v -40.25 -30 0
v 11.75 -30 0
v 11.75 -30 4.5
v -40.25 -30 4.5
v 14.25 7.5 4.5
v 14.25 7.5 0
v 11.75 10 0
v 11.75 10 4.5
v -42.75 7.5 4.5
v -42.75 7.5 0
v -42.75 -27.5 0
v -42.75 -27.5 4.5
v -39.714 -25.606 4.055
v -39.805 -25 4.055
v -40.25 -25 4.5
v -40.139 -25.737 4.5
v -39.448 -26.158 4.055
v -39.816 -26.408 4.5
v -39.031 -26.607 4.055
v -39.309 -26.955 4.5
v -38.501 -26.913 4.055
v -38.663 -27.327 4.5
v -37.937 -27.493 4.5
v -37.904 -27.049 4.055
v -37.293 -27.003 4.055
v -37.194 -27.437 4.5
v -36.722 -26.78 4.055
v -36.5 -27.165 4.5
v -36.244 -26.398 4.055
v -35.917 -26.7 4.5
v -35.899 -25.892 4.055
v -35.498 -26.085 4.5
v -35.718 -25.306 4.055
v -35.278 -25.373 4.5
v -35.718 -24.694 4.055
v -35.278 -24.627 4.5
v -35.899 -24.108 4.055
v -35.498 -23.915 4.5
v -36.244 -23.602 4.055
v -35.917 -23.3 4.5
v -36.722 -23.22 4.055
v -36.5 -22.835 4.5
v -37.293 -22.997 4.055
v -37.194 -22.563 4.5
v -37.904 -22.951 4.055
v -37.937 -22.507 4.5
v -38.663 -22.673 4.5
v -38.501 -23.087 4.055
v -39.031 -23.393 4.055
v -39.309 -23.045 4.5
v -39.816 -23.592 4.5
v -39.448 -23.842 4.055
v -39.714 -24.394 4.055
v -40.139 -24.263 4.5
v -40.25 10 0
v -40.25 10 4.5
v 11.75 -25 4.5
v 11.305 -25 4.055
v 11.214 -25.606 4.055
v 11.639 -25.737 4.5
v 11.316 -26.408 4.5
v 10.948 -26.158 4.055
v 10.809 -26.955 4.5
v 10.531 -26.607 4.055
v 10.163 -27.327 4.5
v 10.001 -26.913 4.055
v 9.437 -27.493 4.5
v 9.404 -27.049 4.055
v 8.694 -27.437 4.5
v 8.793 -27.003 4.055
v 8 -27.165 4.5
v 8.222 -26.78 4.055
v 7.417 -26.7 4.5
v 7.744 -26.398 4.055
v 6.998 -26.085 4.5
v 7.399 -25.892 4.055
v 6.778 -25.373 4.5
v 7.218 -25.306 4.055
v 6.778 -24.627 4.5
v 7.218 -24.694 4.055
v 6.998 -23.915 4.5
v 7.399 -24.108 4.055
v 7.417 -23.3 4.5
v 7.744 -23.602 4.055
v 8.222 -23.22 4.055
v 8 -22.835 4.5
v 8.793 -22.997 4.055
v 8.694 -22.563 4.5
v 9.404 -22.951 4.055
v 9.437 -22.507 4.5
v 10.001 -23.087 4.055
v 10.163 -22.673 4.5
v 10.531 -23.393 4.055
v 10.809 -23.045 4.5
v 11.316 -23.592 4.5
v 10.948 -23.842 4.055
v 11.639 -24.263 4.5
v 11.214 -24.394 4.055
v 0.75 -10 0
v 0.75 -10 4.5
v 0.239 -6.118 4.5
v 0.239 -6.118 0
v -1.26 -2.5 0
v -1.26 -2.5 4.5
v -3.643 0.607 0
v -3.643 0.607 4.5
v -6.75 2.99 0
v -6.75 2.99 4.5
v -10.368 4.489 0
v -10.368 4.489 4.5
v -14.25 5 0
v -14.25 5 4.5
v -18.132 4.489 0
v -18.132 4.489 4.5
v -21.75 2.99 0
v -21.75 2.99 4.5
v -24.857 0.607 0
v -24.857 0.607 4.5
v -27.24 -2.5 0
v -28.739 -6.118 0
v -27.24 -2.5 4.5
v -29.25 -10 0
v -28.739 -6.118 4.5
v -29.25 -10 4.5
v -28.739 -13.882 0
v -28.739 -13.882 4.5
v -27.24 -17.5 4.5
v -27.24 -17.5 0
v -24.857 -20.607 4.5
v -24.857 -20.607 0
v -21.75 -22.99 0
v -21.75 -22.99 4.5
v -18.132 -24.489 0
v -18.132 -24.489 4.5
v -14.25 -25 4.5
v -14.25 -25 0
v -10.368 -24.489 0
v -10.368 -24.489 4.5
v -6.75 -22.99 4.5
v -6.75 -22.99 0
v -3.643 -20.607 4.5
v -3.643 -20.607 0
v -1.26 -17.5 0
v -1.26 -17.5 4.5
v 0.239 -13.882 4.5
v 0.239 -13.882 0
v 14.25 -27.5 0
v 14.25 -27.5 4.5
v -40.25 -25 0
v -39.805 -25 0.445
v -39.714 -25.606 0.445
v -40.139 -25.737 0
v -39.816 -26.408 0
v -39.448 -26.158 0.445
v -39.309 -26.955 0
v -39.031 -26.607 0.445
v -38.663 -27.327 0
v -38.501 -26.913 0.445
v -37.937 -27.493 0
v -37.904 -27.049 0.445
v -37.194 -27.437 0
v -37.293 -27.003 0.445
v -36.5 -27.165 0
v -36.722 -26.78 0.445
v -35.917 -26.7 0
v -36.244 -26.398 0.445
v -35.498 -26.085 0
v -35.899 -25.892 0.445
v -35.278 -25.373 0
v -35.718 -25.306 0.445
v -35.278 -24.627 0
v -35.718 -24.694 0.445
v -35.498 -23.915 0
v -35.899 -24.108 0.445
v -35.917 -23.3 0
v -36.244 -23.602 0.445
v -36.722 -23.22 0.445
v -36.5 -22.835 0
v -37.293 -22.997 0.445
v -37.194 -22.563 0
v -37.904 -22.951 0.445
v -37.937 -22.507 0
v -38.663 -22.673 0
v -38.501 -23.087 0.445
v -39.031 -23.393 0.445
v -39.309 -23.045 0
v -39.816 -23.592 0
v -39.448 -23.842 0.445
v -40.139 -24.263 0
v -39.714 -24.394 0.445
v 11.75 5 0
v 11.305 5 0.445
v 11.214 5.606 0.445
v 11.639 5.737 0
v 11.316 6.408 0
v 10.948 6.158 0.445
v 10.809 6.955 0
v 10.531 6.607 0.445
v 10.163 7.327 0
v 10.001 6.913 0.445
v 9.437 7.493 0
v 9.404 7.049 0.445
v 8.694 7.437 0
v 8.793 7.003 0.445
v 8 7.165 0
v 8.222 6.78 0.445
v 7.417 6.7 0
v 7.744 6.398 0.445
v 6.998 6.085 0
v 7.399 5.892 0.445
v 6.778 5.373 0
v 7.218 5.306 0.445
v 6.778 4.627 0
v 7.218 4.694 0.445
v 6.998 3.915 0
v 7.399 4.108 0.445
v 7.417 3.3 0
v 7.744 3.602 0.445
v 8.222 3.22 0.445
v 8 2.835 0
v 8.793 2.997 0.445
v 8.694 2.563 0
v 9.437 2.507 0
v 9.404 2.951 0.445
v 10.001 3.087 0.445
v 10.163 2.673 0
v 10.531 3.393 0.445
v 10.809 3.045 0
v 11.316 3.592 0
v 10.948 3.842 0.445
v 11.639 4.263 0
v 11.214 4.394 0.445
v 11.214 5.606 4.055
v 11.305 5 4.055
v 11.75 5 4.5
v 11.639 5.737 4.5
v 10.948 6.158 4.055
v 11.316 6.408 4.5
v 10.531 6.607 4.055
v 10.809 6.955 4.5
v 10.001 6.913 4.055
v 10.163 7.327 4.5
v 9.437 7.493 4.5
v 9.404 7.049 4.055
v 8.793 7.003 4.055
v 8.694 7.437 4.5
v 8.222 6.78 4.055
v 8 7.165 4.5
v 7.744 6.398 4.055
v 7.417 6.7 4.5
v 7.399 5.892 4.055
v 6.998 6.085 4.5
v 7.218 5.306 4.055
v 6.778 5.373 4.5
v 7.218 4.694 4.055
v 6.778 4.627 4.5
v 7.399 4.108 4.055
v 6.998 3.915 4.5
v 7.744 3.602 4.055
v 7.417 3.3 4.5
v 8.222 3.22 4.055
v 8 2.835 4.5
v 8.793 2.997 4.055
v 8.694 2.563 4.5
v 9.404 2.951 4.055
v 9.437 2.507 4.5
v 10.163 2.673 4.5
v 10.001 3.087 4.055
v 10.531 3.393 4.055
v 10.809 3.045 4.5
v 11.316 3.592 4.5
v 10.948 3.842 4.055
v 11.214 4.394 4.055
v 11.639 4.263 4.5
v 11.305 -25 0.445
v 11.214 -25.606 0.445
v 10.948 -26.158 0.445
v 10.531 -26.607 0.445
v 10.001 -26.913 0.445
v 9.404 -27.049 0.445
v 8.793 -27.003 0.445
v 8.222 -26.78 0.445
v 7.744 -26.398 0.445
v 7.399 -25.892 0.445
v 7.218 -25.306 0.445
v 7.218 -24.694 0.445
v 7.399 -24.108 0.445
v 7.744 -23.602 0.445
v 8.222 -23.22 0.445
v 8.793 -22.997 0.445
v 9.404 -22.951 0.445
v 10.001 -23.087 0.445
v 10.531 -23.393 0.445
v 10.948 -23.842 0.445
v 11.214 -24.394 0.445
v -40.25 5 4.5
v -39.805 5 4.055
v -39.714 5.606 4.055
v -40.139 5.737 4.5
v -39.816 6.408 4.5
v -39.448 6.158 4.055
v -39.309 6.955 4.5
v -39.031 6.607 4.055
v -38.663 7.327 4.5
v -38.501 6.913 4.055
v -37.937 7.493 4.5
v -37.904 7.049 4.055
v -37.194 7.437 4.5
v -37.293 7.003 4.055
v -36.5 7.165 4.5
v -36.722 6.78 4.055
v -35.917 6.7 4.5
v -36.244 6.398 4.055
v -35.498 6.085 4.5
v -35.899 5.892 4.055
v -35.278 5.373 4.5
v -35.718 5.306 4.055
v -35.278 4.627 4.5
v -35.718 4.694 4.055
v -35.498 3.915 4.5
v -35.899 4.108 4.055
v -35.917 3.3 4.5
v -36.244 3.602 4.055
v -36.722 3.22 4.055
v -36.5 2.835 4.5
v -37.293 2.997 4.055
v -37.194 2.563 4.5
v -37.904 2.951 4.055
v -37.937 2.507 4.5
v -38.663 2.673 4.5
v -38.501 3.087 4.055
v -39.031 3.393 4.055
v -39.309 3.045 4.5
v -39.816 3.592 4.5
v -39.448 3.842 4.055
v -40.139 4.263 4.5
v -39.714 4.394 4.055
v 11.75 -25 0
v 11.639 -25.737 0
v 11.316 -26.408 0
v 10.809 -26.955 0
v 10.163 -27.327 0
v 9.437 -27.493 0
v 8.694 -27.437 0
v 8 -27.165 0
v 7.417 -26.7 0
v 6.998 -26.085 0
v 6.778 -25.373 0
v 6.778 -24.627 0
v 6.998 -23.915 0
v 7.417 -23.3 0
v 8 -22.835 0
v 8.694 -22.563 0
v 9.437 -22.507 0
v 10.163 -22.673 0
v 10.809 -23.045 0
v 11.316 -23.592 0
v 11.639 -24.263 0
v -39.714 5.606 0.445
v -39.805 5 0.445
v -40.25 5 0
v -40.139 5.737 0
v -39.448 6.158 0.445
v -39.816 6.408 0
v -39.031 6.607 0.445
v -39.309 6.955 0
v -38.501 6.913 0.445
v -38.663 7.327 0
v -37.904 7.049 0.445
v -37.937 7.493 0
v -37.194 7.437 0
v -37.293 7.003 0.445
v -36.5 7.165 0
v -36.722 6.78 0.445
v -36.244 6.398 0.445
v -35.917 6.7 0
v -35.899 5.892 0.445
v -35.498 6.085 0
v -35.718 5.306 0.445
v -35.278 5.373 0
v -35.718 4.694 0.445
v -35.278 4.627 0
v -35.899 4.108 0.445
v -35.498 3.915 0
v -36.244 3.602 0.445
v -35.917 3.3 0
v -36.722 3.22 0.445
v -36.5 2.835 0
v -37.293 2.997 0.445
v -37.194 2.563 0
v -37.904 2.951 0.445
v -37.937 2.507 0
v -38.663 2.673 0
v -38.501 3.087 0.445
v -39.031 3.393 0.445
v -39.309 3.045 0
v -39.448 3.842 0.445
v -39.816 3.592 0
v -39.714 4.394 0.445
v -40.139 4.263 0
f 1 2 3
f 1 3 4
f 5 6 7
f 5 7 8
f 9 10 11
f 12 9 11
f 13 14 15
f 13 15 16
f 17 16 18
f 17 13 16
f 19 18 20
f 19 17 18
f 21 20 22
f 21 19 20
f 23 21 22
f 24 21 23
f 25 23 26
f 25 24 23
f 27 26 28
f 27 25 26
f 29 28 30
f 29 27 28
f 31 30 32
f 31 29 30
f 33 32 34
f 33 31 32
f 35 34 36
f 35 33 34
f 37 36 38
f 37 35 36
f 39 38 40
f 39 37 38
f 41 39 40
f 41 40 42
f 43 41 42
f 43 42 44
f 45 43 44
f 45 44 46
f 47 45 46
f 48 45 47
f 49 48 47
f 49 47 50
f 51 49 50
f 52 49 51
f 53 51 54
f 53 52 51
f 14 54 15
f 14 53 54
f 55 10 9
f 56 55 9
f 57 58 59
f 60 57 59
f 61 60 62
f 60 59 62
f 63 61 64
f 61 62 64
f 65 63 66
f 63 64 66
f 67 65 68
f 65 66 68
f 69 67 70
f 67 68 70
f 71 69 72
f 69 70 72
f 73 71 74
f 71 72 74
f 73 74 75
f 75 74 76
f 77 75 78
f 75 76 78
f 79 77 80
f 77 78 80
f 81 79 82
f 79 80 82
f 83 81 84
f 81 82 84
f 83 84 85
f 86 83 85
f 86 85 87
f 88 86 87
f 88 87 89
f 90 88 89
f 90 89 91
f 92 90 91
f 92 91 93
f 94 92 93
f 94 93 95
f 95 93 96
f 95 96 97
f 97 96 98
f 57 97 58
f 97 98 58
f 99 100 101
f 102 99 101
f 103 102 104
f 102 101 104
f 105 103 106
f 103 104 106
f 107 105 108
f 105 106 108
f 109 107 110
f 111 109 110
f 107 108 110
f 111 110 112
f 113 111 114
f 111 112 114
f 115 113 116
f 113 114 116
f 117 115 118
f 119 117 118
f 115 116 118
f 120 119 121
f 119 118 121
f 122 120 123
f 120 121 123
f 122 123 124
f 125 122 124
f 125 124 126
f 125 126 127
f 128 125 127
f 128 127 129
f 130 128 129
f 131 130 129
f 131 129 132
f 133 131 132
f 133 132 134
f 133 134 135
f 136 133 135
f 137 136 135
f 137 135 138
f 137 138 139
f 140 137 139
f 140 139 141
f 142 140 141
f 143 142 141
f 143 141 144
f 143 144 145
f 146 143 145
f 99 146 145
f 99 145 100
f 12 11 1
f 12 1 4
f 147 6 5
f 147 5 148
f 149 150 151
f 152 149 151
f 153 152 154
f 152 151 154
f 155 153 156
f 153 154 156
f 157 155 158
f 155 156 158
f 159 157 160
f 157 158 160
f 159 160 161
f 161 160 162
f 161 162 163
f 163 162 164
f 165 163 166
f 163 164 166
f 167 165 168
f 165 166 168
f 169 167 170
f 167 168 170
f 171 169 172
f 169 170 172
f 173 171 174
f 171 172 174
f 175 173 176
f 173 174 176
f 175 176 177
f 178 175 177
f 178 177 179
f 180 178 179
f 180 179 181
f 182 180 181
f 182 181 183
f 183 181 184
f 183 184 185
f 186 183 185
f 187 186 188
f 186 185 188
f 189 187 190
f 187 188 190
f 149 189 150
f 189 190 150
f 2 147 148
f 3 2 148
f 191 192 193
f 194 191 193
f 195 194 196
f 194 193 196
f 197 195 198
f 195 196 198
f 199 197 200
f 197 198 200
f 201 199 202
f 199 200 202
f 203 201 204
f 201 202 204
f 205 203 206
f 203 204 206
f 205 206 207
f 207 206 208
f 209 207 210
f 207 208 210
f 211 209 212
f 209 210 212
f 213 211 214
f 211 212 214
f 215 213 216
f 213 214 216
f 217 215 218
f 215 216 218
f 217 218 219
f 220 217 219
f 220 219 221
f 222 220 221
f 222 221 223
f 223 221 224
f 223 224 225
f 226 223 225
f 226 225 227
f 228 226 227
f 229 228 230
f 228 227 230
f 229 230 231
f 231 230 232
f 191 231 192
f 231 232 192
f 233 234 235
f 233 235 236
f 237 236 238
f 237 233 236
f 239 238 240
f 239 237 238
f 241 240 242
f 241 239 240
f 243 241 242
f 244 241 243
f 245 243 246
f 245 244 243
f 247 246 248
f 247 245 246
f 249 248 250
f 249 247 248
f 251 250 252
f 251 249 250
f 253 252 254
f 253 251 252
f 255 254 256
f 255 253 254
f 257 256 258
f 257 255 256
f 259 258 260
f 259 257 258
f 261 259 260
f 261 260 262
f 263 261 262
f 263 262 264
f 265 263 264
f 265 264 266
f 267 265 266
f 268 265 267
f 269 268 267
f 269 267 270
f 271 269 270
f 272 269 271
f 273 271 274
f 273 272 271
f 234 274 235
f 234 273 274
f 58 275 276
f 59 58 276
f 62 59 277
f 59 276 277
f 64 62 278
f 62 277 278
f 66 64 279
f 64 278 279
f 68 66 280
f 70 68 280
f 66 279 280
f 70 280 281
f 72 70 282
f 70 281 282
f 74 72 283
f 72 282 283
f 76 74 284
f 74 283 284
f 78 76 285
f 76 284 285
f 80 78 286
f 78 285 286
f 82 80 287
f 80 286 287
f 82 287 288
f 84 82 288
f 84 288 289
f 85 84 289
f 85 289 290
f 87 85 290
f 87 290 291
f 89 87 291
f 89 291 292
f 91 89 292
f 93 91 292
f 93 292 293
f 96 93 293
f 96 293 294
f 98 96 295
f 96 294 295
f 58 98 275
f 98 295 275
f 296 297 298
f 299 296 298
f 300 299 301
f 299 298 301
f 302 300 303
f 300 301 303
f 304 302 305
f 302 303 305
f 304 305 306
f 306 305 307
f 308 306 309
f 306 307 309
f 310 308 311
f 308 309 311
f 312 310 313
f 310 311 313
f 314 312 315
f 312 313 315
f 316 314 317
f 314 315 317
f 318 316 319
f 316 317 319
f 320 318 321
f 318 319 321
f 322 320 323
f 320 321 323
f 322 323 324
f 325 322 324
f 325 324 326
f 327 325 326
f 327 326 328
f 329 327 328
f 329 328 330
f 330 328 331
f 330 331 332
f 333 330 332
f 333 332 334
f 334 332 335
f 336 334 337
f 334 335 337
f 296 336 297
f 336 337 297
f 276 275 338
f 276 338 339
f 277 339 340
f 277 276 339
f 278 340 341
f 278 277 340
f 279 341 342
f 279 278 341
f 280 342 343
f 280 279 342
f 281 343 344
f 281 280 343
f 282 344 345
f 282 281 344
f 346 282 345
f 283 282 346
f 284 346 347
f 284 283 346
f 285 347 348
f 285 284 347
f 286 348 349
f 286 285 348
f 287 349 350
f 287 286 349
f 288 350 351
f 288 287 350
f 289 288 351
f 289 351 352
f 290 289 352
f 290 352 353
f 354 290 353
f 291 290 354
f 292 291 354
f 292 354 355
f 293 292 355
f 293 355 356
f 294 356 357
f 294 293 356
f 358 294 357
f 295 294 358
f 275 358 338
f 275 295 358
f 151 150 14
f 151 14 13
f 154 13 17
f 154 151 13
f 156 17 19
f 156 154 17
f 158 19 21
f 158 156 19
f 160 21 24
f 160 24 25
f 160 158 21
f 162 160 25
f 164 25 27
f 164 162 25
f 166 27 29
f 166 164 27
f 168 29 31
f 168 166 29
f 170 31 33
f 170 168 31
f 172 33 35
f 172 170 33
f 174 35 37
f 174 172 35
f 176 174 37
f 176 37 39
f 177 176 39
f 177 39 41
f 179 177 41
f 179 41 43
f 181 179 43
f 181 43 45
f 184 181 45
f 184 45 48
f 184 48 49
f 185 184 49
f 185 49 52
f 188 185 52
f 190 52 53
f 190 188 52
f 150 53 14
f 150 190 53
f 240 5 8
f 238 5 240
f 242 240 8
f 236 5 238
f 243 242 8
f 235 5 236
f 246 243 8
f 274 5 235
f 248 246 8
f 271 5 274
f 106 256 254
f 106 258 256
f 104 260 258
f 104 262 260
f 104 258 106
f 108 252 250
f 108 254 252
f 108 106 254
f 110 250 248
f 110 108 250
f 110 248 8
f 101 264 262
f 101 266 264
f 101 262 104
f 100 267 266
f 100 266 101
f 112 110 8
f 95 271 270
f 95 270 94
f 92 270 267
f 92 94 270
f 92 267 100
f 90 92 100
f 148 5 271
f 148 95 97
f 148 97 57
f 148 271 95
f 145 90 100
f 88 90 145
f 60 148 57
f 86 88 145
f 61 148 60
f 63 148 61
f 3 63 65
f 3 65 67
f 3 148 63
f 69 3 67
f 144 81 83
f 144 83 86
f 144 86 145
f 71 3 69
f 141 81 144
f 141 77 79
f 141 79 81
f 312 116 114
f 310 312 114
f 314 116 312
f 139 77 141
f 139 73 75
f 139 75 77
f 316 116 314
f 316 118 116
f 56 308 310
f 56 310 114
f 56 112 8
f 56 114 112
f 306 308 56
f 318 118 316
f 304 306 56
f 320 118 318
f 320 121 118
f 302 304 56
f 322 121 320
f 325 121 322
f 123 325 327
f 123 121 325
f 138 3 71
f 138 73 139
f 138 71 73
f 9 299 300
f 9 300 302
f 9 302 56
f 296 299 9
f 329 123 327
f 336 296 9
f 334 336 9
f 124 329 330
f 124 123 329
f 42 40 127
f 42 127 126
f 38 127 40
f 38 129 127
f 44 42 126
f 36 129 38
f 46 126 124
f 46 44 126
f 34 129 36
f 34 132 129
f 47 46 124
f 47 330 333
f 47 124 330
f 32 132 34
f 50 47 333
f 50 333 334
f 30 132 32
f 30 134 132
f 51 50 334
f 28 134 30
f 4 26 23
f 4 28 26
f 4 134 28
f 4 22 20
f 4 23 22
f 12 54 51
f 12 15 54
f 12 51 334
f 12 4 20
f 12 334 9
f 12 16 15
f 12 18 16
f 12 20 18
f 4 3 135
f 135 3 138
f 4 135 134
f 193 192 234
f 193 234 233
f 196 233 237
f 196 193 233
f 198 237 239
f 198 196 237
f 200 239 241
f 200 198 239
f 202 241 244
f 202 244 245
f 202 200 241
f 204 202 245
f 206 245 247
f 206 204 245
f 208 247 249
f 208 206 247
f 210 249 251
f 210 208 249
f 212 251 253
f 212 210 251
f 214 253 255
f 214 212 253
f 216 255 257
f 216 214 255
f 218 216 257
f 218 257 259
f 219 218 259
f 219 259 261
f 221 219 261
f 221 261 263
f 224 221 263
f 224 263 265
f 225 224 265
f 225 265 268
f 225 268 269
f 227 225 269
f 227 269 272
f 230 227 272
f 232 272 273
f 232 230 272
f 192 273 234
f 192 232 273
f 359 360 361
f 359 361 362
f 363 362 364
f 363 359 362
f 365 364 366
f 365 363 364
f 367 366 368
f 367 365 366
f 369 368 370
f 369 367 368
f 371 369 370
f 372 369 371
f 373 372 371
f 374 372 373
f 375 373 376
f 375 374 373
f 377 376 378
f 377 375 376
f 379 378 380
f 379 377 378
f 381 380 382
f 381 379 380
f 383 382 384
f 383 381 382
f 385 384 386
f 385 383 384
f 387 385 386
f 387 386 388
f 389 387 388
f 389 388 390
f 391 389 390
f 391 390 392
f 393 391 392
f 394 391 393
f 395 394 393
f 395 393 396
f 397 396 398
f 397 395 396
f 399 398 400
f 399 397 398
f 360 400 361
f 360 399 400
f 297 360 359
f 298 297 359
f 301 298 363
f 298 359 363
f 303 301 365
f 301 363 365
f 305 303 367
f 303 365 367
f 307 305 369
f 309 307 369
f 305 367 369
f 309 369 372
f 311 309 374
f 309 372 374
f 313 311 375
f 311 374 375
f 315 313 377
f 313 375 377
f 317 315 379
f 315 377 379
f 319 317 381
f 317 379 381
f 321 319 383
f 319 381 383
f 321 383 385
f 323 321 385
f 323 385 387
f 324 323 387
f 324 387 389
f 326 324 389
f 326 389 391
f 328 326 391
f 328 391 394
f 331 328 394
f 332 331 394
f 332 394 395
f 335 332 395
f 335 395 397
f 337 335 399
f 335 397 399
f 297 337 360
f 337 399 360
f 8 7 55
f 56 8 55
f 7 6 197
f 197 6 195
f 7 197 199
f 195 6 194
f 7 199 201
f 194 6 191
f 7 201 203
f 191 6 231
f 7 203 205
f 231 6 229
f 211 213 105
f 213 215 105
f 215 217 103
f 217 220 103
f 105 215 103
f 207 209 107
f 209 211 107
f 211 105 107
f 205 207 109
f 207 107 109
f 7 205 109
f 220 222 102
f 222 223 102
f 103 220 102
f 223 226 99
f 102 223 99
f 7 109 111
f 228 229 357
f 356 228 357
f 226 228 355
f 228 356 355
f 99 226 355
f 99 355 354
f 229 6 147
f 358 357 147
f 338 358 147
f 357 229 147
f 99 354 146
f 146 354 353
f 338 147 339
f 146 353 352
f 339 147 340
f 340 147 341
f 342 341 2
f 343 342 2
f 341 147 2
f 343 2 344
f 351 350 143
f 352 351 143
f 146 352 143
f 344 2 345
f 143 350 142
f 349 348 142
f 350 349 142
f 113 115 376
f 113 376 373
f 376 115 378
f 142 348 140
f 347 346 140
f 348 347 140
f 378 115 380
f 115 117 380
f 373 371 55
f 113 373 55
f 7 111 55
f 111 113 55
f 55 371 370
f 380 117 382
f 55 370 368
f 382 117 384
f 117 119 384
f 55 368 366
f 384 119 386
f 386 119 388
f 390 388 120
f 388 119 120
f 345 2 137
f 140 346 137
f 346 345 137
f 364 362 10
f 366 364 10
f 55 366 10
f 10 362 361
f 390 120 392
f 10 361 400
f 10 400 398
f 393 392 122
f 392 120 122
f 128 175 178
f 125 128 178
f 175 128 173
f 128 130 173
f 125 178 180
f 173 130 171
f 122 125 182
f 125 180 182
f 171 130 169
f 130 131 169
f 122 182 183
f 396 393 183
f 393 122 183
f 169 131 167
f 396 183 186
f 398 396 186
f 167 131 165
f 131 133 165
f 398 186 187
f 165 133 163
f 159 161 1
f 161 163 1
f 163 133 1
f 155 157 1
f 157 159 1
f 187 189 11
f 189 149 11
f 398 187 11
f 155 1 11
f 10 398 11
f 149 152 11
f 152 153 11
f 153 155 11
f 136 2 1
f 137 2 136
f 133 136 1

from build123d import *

# Parameters (mm, degrees)
SKETCH_1_W          = 28.5
SKETCH_1_H          = 20
SKETCH_1_R          = 2.055
EXTRUDE_1_DEPTH     = 4.5
CHAMFER_1_SIZE      = 2.5
CHAMFER_2_SIZE      = 0.445
SKETCH_2_R          = 15
CUT_EXTRUDE_1_DEPTH = 5.5


with BuildPart() as part:
    # Эскиз1 → Бобышка-Вытянуть1 (new body)
    with BuildSketch(Plane.XY):
        Rectangle(SKETCH_1_W, SKETCH_1_H)
        with Locations((9.25, 5)):
            Circle(SKETCH_1_R, mode=Mode.SUBTRACT)
    extrude(amount=EXTRUDE_1_DEPTH)

    # Фаска1
    chamfer_1_edges = [part.edges().sort_by_distance(p)[0] for p in [
        (14.25, 10, 2.25),
    ]]
    chamfer(chamfer_1_edges, length=CHAMFER_1_SIZE)

    # Фаска2
    chamfer_2_edges = [part.edges().sort_by_distance(p)[0] for p in [
        (7.195, 5, 0),
        (7.195, 5, 4.5),
    ]]
    chamfer(chamfer_2_edges, length=CHAMFER_2_SIZE)

    # Зеркальное отражение1: part across plane


with BuildPart() as part_1:
    add(part.part)
    add(part.part.mirror(Plane(origin=(-14.25, -10, 4.5), x_dir=(0, 0, 1), z_dir=(0, 1, 0))))

    # Зеркальное отражение2: part across plane


with BuildPart() as part_2:
    add(part_1.part)
    add(part_1.part.mirror(Plane(origin=(-14.25, -10, 4.5), x_dir=(0, 0, 1), z_dir=(1, 0, 0))))

    # Эскиз2 → Вырез-Вытянуть1 (cut, through all)
    with BuildSketch(Plane.XY.offset(4.5)):
        with Locations((-14.25, -10)):
            Circle(SKETCH_2_R)
    extrude(amount=-CUT_EXTRUDE_1_DEPTH, mode=Mode.SUBTRACT)


solid = part_2.part
